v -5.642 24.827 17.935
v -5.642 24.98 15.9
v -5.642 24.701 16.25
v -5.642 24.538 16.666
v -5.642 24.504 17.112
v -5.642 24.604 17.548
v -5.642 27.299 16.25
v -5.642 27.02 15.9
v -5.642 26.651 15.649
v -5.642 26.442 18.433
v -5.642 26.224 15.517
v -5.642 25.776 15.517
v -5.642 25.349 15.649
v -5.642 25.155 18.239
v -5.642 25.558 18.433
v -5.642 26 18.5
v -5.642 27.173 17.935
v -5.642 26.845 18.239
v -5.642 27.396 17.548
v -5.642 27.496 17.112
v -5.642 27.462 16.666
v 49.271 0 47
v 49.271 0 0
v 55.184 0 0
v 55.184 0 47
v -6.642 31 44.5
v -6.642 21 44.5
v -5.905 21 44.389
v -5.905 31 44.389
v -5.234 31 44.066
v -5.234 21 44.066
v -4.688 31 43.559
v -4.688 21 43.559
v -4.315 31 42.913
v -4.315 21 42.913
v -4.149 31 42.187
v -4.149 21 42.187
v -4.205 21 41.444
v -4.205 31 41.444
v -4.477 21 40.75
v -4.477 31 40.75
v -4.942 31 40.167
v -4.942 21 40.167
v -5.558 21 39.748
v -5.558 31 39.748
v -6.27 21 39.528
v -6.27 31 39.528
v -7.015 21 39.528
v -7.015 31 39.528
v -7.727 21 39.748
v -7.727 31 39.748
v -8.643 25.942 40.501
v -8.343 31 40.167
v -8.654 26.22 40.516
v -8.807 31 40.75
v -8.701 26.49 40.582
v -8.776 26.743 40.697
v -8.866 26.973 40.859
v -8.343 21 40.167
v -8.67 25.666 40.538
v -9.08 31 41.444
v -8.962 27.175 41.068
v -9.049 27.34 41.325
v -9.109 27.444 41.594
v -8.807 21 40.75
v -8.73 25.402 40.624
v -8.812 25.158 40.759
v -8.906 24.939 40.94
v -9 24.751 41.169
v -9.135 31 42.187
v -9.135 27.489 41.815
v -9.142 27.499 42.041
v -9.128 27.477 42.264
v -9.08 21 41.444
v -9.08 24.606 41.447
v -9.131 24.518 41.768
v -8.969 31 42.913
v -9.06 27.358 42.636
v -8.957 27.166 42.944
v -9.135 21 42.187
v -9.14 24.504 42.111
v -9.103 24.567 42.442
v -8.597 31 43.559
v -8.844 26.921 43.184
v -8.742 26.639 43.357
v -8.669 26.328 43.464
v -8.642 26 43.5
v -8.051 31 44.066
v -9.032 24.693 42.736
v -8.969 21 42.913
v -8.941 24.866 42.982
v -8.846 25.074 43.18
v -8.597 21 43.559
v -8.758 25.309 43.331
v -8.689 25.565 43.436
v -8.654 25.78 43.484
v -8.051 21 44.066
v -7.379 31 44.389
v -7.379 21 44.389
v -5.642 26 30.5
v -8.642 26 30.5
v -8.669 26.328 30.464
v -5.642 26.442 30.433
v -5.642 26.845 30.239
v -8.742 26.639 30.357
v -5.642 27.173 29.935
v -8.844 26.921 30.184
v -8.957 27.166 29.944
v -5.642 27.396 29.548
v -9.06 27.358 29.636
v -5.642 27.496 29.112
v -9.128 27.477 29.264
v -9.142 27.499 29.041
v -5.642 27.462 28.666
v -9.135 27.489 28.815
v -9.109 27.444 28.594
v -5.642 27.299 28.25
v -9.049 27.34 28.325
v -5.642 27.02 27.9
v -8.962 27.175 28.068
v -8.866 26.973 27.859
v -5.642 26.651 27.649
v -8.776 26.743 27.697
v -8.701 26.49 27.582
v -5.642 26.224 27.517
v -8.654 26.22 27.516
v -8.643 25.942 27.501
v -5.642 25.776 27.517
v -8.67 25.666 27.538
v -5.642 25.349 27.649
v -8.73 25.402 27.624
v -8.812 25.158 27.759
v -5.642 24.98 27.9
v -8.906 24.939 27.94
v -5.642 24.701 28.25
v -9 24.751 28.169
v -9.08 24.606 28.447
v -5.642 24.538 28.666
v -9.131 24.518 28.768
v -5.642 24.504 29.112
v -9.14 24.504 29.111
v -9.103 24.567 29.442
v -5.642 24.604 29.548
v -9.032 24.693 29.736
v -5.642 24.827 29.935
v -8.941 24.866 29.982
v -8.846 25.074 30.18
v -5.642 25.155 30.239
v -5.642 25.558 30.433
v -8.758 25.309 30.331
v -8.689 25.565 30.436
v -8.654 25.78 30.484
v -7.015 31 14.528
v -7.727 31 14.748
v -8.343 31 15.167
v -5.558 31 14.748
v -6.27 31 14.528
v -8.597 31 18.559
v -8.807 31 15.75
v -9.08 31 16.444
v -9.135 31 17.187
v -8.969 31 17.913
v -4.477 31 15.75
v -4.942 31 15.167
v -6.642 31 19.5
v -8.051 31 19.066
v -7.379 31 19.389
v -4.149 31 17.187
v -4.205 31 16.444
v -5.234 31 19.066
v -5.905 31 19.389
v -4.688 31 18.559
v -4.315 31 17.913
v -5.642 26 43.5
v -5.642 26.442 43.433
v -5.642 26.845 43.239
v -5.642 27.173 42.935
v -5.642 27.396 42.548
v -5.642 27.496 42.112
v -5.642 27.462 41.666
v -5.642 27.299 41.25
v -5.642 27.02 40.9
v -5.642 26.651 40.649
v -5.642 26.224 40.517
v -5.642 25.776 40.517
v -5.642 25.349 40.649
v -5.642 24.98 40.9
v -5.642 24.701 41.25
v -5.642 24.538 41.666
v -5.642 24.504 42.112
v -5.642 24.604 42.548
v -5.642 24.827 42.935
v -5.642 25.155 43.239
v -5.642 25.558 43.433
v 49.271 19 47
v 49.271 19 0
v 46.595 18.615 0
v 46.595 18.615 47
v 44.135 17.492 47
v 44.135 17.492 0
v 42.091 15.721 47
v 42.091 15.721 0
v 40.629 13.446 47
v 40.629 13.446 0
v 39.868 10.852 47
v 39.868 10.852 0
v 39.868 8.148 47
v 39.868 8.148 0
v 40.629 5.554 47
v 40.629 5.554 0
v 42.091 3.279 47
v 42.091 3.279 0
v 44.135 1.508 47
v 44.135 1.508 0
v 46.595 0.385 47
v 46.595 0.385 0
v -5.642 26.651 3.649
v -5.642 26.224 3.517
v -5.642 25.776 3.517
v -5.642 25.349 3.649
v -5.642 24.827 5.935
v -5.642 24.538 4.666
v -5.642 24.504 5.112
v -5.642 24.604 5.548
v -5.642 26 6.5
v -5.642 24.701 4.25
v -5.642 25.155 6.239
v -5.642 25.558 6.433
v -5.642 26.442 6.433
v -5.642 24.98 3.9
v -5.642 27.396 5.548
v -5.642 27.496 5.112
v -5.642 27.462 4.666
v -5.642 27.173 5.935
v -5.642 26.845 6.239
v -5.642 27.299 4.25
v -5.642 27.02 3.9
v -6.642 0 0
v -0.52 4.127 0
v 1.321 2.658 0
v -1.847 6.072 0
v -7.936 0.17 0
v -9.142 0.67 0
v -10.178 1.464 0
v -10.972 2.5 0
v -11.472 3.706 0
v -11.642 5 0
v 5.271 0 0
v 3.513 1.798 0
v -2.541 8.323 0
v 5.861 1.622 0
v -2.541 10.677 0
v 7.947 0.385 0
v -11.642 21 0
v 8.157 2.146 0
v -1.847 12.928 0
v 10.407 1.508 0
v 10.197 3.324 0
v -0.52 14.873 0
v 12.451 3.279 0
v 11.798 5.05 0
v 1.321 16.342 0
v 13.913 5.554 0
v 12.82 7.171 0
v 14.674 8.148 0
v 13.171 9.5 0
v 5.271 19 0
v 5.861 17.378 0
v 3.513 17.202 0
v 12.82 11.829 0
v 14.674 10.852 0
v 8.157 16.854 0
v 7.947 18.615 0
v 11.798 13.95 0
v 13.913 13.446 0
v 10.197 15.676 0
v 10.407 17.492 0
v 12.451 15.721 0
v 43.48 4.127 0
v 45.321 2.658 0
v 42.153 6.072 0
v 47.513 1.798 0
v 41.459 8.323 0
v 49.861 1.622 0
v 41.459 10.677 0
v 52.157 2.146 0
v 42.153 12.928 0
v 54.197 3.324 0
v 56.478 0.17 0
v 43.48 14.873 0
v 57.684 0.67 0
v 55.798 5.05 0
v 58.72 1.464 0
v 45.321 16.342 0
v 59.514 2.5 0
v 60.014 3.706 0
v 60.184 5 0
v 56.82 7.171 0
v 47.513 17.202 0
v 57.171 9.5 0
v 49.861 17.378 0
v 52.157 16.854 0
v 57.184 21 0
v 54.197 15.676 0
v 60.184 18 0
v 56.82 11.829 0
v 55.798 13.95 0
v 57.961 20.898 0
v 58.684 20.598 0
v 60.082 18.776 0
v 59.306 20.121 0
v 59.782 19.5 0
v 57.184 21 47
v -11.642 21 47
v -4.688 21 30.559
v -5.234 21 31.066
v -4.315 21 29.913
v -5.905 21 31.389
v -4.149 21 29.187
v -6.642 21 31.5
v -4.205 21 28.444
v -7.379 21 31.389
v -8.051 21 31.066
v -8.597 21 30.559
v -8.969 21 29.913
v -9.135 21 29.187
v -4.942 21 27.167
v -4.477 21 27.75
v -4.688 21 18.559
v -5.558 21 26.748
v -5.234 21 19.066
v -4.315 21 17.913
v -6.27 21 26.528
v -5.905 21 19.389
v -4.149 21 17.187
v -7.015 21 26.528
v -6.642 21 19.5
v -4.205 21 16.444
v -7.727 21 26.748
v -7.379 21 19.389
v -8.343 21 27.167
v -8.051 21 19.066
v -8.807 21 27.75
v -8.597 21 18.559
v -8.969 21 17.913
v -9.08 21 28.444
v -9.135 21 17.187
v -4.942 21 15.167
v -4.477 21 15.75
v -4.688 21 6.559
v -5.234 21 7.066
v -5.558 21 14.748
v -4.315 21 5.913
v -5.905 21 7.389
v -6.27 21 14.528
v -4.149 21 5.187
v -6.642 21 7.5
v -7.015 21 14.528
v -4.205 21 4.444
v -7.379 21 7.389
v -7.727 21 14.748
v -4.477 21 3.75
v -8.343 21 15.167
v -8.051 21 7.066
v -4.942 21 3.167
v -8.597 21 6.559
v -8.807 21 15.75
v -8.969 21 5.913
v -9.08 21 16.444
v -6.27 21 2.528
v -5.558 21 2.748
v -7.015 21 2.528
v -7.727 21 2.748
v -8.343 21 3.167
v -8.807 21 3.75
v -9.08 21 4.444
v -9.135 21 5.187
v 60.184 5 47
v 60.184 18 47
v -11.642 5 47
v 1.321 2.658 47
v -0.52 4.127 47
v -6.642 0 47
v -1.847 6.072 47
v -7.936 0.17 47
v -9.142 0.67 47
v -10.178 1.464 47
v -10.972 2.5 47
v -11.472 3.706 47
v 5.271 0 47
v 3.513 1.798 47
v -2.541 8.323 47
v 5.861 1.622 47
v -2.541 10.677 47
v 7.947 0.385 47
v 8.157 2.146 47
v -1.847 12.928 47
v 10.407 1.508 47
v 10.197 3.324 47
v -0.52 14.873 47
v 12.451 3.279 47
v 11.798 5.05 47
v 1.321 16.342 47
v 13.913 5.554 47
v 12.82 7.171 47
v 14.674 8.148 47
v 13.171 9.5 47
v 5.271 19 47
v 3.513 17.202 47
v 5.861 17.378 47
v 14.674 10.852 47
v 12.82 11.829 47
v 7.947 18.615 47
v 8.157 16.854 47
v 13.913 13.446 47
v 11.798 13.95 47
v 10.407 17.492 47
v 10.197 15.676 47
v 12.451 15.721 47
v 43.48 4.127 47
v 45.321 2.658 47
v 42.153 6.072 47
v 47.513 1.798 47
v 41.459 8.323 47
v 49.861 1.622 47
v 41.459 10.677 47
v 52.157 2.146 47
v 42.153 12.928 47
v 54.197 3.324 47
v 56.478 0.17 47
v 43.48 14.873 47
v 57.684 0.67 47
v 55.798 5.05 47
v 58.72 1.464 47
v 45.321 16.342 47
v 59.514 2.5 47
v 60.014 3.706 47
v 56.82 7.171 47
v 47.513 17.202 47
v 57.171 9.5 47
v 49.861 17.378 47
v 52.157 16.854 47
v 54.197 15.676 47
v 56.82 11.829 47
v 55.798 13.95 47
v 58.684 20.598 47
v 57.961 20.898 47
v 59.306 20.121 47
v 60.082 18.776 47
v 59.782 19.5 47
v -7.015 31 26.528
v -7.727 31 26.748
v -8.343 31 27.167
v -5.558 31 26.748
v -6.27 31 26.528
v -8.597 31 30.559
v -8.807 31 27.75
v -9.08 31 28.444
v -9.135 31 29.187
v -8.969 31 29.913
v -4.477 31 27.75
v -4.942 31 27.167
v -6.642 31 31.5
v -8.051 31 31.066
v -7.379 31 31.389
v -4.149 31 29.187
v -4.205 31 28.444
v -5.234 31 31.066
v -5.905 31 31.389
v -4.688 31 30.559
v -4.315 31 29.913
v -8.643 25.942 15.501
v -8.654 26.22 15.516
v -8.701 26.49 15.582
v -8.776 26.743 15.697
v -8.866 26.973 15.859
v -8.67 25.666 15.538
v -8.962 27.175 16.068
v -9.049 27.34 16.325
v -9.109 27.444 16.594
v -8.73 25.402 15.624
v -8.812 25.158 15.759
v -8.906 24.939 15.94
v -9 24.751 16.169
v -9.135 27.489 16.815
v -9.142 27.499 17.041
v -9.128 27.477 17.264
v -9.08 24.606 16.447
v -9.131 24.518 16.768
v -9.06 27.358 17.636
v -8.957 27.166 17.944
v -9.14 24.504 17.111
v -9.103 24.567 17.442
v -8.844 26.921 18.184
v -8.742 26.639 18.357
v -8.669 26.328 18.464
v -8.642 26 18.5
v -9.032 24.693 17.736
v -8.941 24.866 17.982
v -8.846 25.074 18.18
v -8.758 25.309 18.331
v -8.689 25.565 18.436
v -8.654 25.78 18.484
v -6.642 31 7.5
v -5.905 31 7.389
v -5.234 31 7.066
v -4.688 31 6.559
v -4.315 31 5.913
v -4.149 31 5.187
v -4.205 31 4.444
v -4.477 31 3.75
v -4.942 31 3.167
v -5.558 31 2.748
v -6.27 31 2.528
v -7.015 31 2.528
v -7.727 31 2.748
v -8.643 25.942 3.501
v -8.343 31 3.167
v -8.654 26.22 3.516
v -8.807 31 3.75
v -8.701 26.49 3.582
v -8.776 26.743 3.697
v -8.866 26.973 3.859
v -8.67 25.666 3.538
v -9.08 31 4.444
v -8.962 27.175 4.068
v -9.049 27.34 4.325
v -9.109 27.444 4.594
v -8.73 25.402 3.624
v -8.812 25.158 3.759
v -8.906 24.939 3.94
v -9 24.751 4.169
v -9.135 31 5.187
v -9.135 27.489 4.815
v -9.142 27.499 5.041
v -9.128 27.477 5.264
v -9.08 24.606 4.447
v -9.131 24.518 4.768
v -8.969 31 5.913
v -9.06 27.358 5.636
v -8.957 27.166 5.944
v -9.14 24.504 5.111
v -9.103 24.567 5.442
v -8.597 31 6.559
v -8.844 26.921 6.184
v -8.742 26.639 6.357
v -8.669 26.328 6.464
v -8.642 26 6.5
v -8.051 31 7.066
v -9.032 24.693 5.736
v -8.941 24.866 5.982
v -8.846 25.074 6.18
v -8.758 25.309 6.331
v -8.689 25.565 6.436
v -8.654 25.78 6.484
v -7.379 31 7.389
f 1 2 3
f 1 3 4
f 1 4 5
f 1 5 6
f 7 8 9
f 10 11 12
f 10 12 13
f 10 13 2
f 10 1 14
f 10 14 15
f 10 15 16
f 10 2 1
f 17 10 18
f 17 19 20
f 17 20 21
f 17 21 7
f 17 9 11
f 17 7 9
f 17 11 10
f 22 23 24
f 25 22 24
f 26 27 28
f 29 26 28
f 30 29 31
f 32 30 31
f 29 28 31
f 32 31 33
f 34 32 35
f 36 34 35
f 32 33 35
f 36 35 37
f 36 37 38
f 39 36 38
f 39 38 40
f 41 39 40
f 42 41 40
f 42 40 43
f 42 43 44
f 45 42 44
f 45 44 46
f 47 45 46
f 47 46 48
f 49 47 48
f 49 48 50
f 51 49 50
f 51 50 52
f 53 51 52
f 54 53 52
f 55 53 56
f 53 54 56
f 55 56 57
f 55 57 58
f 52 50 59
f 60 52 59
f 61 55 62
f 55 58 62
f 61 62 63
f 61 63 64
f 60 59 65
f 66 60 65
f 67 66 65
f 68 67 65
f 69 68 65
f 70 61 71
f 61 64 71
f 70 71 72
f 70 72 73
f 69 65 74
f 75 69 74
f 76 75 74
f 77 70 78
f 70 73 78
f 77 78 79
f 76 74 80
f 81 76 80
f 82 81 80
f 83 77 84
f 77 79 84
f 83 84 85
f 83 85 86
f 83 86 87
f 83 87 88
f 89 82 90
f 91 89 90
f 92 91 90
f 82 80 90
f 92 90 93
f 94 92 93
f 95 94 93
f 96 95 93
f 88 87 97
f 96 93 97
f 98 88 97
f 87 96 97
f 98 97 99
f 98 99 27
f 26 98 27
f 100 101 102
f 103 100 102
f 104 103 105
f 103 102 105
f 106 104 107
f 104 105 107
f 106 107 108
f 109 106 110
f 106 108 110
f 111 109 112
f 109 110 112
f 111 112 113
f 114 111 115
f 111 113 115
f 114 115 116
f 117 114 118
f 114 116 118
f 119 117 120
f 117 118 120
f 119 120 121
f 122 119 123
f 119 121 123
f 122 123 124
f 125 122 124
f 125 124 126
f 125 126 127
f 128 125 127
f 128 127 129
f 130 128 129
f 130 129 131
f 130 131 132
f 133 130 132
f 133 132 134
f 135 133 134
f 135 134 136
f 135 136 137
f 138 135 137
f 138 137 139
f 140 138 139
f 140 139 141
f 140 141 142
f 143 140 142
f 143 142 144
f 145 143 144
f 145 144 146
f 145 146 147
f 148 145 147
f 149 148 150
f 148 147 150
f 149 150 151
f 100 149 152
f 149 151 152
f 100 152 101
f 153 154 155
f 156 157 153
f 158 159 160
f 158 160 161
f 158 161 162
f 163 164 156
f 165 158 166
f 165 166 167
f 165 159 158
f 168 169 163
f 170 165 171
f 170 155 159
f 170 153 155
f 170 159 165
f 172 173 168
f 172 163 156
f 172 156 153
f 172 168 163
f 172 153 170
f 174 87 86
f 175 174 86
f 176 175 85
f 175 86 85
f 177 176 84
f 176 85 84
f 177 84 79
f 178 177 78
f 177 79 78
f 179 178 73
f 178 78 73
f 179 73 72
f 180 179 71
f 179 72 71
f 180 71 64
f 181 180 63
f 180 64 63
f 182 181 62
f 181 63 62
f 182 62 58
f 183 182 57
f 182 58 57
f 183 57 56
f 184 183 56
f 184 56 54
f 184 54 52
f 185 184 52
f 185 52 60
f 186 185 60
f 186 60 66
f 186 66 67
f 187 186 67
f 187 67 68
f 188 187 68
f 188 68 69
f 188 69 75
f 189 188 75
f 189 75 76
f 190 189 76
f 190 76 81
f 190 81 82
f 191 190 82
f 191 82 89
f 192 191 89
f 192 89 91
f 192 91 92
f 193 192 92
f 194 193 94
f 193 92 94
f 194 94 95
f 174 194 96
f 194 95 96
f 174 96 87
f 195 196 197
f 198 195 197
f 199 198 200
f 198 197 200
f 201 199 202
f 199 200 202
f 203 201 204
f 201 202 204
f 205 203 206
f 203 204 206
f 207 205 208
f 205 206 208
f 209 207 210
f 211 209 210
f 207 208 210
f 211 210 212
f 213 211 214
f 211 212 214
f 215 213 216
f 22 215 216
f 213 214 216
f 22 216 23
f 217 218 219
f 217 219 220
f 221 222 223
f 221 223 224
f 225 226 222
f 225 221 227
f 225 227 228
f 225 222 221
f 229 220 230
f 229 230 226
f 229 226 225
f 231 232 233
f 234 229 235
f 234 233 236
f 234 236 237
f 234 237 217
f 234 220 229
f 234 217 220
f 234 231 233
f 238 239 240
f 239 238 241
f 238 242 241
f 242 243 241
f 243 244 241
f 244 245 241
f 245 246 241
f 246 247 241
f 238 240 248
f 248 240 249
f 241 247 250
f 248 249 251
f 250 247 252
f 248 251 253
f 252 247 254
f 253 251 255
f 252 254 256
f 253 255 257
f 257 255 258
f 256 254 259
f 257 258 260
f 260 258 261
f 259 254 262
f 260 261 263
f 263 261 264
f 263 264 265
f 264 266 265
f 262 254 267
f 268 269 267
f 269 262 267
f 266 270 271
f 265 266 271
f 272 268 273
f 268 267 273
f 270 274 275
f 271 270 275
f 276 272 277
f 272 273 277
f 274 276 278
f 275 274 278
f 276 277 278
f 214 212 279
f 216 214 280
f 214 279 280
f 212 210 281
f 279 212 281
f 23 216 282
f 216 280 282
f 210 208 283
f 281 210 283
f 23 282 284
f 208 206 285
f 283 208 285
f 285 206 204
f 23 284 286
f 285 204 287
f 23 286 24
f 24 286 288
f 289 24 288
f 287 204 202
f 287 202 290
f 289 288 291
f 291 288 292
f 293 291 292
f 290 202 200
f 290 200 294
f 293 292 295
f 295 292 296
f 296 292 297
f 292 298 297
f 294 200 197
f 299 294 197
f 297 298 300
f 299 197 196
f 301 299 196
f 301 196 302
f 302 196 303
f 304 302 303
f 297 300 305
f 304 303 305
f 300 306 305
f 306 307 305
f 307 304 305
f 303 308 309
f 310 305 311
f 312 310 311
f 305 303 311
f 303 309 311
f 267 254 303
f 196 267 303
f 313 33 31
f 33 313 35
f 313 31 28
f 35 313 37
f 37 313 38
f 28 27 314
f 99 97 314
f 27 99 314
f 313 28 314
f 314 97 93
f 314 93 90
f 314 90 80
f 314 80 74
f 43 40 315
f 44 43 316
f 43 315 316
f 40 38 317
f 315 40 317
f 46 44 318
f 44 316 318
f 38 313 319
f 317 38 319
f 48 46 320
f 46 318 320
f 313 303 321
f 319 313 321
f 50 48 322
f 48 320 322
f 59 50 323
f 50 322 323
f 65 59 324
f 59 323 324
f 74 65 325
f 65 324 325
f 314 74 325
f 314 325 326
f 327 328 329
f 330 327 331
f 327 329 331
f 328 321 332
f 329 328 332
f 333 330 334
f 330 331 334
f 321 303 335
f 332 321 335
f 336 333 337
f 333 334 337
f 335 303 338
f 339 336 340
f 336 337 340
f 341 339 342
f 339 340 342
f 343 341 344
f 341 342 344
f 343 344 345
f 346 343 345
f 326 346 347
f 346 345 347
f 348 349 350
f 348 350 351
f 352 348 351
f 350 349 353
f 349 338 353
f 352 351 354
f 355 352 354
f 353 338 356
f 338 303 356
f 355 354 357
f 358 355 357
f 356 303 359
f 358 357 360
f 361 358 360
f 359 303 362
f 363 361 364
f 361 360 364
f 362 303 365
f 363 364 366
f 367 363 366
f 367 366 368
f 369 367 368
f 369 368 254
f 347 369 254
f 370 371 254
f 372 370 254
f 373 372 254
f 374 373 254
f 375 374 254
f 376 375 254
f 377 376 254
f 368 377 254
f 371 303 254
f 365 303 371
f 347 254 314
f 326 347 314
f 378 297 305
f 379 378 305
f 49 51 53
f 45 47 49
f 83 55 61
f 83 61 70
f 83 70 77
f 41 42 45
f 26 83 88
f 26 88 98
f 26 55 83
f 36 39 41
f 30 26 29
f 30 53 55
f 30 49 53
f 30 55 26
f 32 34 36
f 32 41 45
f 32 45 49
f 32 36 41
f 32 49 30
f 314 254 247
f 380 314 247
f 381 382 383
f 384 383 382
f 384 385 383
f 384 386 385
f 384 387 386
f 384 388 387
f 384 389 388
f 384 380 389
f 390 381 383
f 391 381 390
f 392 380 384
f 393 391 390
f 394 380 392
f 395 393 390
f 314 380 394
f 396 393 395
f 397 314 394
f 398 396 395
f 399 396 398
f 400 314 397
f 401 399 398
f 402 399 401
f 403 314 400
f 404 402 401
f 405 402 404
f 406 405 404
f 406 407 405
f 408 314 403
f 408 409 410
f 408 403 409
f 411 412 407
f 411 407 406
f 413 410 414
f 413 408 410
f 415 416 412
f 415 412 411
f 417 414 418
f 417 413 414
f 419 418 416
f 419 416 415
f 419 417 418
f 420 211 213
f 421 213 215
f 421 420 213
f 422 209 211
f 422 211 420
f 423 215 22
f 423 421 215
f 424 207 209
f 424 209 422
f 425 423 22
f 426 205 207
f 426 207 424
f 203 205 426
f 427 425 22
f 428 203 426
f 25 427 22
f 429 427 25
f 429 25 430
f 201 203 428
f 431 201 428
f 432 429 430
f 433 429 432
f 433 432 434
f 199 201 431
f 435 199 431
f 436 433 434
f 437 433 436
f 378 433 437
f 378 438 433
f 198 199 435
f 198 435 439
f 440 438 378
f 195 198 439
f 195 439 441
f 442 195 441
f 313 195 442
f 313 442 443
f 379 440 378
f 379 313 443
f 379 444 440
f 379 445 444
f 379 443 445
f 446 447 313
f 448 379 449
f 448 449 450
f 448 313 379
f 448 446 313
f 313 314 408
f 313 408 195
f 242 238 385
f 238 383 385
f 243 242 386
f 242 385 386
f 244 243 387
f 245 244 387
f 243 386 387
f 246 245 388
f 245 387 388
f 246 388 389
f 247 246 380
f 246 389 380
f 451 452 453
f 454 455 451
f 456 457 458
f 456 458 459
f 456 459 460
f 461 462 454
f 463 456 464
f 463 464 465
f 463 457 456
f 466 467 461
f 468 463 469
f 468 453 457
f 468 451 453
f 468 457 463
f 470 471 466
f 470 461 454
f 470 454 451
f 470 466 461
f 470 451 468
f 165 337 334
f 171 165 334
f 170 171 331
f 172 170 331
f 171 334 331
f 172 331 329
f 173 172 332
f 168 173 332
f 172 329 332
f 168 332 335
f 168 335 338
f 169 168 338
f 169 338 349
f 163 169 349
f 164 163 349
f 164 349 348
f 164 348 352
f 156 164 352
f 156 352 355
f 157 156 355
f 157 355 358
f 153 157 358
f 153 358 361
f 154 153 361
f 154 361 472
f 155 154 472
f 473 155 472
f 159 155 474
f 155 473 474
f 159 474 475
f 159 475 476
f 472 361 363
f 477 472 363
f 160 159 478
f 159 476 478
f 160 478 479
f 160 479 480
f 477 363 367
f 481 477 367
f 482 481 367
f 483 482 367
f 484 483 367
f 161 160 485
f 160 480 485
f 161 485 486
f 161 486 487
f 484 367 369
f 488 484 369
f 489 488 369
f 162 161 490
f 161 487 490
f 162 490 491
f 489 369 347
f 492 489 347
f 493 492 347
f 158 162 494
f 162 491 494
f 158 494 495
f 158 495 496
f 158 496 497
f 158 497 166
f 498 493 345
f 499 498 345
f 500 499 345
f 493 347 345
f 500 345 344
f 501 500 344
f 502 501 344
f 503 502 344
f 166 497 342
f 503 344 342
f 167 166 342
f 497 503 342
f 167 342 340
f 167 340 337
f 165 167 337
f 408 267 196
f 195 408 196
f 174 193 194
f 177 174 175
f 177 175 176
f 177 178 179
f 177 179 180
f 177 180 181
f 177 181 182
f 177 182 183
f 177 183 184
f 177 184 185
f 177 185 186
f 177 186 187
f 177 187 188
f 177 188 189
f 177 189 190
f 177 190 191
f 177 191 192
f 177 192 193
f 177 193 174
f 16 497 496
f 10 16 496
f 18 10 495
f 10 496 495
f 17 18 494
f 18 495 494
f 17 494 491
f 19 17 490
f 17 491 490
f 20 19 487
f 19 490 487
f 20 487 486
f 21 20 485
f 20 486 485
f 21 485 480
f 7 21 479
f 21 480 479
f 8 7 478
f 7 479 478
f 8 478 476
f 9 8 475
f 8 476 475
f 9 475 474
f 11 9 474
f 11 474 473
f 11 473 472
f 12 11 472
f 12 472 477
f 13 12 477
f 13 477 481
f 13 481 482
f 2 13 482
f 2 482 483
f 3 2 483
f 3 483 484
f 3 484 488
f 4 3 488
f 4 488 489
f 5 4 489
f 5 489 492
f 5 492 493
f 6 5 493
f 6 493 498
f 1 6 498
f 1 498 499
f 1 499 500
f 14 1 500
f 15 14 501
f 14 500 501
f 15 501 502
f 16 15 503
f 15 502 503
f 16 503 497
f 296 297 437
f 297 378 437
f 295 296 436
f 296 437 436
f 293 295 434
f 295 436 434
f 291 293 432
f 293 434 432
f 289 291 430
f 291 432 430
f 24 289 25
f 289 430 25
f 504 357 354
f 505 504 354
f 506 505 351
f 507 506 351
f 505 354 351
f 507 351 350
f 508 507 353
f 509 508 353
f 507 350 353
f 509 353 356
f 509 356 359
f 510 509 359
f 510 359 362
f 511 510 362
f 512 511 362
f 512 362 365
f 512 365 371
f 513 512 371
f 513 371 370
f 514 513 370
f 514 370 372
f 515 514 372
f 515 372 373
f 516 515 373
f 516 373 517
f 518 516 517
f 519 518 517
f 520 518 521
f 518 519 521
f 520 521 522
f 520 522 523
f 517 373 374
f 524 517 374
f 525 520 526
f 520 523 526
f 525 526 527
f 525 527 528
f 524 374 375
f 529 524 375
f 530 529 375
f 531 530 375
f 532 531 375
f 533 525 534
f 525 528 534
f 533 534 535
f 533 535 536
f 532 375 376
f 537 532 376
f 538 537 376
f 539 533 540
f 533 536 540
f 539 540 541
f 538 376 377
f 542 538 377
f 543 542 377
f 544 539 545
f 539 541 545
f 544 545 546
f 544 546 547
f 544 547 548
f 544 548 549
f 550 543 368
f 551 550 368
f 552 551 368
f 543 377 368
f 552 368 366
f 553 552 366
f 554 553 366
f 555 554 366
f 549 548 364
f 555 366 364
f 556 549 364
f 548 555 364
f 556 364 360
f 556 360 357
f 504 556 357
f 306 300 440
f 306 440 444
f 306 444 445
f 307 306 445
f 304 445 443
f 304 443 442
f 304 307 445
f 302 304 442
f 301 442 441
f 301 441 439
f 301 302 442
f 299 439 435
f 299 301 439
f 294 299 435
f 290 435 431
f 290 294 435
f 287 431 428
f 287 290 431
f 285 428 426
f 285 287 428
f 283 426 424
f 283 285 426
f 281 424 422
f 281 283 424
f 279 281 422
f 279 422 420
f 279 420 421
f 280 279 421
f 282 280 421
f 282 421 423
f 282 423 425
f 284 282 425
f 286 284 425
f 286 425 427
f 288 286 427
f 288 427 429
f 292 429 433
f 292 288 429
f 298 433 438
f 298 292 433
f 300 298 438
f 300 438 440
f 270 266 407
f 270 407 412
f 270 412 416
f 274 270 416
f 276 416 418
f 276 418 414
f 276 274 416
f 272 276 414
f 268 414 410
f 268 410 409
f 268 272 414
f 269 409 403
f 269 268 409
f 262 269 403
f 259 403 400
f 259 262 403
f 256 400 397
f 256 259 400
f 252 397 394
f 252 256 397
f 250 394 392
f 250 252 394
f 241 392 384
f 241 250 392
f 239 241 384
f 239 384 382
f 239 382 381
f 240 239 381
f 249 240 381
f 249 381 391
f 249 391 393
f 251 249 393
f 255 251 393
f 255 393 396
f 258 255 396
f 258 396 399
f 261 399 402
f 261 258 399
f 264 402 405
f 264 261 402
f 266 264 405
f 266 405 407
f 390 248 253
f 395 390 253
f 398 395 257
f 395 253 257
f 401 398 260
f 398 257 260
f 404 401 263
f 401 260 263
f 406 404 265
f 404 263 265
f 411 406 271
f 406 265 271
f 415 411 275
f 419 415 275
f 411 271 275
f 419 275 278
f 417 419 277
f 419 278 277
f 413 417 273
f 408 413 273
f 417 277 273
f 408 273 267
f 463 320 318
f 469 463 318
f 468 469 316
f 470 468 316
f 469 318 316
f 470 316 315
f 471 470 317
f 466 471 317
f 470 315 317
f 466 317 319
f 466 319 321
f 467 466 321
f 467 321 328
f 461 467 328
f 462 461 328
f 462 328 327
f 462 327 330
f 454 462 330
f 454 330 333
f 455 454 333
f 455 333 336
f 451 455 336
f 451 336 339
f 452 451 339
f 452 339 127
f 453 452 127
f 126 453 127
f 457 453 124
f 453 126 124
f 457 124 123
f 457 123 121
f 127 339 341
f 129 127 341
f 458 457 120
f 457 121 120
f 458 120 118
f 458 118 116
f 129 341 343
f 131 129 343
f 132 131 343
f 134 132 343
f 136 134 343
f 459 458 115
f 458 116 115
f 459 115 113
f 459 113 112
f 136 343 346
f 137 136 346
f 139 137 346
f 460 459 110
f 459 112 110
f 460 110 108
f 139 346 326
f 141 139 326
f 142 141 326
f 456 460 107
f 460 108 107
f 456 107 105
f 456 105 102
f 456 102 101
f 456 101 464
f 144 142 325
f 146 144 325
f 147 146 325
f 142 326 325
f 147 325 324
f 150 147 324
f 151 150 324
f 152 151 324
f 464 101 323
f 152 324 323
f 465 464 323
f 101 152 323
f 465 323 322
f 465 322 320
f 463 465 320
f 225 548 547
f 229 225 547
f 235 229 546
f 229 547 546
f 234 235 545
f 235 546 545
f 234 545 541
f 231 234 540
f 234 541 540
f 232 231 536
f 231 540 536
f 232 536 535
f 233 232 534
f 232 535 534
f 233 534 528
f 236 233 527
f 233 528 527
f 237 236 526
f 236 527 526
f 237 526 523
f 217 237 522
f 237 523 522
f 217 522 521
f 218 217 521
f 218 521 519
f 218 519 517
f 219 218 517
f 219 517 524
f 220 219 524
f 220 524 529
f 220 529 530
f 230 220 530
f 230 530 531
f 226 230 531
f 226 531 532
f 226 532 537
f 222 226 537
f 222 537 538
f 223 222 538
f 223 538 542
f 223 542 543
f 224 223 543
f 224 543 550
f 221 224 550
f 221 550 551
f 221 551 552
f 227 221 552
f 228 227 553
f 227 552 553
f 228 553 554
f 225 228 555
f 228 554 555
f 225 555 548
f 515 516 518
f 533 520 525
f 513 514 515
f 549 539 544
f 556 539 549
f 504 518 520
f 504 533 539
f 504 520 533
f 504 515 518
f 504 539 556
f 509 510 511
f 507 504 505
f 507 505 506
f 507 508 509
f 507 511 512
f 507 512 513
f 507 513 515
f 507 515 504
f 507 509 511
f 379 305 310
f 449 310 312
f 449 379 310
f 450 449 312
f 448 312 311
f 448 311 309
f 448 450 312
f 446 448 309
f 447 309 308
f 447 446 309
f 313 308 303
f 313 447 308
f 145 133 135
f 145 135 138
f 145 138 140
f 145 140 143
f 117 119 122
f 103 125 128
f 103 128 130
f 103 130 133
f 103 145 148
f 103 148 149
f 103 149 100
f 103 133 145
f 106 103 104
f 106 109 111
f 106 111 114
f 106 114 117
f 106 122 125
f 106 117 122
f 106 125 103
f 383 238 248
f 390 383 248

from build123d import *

# Parameters (mm, degrees)
ESQUISSE1_R             = 7.9
BOSS_EXTRU_1_DEPTH      = 47
CONG_1_R                = 5
CONG_2_R                = 5
CONG_4_R                = 3
ESQUISSE2_R             = 2.5
BOSS_EXTRU_2_DEPTH      = 10
ESQUISSE3_R             = 1.5
ENL_V_MAT_EXTRU_1_DEPTH = 6


with BuildPart() as part:
    # Esquisse1 → Boss.-Extru.1 (new body)
    with BuildSketch(Plane.XY):
        with BuildLine():
            ThreePointArc((5.270999392, 0), (14.770999392, 9.5), (5.270999392, 19))
            Line((5.270999392, 19), (49.270999392, 19))
            ThreePointArc((49.270999392, 19), (39.770999392, 9.5), (49.270999392, 0))
            Line((49.270999392, 0), (60.184195152, 0))
            Line((60.184195152, 0), (60.184195152, 21))
            Line((60.184195152, 21), (-11.642273667, 21))
            Line((-11.642273667, 21), (-11.642273667, 0))
            Line((-11.642273667, 0), (5.270999392, 0))
        make_face()
        with Locations((5.270999392, 9.5)):
            Circle(ESQUISSE1_R, mode=Mode.SUBTRACT)
        with Locations((49.270999392, 9.5)):
            Circle(ESQUISSE1_R, mode=Mode.SUBTRACT)
    extrude(amount=BOSS_EXTRU_1_DEPTH)

    # Congé1
    cong_1_edges = [part.edges().sort_by_distance(p)[0] for p in [
        (-11.642273667, 0, 23.5),
    ]]
    fillet(cong_1_edges, radius=CONG_1_R)

    # Congé2
    cong_2_edges = [part.edges().sort_by_distance(p)[0] for p in [
        (60.184195152, 0, 23.5),
    ]]
    fillet(cong_2_edges, radius=CONG_2_R)

    # Congé4
    cong_4_edges = [part.edges().sort_by_distance(p)[0] for p in [
        (60.184195152, 21, 23.5),
    ]]
    fillet(cong_4_edges, radius=CONG_4_R)

    # Esquisse2 → Boss.-Extru.2 (add)
    with BuildSketch(Plane(origin=(0, 21, 0), x_dir=(1, 0, 0), z_dir=(0, 1, 0))):
        with Locations(Location((-6.642273667, -42, 0), (0, 0, 270))):
            Circle(ESQUISSE2_R)
        with Locations(Location((-6.642273667, -29, 0), (0, 0, 270))):
            Circle(ESQUISSE2_R)
        with Locations(Location((-6.642273667, -17, 0), (0, 0, 270))):
            Circle(ESQUISSE2_R)
        with Locations(Location((-6.642273667, -5, 0), (0, 0, 270))):
            Circle(ESQUISSE2_R)
    extrude(amount=BOSS_EXTRU_2_DEPTH)

    # Esquisse3 → Enlèv. mat.-Extru.1 (cut)
    with BuildSketch(Plane.ZY.offset(11.642273667)):
        with Locations((5, 26)):
            Circle(ESQUISSE3_R)
        with Locations((17, 26)):
            Circle(ESQUISSE3_R)
        with Locations((29, 26)):
            Circle(ESQUISSE3_R)
        with Locations((42, 26)):
            Circle(ESQUISSE3_R)
    extrude(amount=-ENL_V_MAT_EXTRU_1_DEPTH, mode=Mode.SUBTRACT)


solid = part.part
